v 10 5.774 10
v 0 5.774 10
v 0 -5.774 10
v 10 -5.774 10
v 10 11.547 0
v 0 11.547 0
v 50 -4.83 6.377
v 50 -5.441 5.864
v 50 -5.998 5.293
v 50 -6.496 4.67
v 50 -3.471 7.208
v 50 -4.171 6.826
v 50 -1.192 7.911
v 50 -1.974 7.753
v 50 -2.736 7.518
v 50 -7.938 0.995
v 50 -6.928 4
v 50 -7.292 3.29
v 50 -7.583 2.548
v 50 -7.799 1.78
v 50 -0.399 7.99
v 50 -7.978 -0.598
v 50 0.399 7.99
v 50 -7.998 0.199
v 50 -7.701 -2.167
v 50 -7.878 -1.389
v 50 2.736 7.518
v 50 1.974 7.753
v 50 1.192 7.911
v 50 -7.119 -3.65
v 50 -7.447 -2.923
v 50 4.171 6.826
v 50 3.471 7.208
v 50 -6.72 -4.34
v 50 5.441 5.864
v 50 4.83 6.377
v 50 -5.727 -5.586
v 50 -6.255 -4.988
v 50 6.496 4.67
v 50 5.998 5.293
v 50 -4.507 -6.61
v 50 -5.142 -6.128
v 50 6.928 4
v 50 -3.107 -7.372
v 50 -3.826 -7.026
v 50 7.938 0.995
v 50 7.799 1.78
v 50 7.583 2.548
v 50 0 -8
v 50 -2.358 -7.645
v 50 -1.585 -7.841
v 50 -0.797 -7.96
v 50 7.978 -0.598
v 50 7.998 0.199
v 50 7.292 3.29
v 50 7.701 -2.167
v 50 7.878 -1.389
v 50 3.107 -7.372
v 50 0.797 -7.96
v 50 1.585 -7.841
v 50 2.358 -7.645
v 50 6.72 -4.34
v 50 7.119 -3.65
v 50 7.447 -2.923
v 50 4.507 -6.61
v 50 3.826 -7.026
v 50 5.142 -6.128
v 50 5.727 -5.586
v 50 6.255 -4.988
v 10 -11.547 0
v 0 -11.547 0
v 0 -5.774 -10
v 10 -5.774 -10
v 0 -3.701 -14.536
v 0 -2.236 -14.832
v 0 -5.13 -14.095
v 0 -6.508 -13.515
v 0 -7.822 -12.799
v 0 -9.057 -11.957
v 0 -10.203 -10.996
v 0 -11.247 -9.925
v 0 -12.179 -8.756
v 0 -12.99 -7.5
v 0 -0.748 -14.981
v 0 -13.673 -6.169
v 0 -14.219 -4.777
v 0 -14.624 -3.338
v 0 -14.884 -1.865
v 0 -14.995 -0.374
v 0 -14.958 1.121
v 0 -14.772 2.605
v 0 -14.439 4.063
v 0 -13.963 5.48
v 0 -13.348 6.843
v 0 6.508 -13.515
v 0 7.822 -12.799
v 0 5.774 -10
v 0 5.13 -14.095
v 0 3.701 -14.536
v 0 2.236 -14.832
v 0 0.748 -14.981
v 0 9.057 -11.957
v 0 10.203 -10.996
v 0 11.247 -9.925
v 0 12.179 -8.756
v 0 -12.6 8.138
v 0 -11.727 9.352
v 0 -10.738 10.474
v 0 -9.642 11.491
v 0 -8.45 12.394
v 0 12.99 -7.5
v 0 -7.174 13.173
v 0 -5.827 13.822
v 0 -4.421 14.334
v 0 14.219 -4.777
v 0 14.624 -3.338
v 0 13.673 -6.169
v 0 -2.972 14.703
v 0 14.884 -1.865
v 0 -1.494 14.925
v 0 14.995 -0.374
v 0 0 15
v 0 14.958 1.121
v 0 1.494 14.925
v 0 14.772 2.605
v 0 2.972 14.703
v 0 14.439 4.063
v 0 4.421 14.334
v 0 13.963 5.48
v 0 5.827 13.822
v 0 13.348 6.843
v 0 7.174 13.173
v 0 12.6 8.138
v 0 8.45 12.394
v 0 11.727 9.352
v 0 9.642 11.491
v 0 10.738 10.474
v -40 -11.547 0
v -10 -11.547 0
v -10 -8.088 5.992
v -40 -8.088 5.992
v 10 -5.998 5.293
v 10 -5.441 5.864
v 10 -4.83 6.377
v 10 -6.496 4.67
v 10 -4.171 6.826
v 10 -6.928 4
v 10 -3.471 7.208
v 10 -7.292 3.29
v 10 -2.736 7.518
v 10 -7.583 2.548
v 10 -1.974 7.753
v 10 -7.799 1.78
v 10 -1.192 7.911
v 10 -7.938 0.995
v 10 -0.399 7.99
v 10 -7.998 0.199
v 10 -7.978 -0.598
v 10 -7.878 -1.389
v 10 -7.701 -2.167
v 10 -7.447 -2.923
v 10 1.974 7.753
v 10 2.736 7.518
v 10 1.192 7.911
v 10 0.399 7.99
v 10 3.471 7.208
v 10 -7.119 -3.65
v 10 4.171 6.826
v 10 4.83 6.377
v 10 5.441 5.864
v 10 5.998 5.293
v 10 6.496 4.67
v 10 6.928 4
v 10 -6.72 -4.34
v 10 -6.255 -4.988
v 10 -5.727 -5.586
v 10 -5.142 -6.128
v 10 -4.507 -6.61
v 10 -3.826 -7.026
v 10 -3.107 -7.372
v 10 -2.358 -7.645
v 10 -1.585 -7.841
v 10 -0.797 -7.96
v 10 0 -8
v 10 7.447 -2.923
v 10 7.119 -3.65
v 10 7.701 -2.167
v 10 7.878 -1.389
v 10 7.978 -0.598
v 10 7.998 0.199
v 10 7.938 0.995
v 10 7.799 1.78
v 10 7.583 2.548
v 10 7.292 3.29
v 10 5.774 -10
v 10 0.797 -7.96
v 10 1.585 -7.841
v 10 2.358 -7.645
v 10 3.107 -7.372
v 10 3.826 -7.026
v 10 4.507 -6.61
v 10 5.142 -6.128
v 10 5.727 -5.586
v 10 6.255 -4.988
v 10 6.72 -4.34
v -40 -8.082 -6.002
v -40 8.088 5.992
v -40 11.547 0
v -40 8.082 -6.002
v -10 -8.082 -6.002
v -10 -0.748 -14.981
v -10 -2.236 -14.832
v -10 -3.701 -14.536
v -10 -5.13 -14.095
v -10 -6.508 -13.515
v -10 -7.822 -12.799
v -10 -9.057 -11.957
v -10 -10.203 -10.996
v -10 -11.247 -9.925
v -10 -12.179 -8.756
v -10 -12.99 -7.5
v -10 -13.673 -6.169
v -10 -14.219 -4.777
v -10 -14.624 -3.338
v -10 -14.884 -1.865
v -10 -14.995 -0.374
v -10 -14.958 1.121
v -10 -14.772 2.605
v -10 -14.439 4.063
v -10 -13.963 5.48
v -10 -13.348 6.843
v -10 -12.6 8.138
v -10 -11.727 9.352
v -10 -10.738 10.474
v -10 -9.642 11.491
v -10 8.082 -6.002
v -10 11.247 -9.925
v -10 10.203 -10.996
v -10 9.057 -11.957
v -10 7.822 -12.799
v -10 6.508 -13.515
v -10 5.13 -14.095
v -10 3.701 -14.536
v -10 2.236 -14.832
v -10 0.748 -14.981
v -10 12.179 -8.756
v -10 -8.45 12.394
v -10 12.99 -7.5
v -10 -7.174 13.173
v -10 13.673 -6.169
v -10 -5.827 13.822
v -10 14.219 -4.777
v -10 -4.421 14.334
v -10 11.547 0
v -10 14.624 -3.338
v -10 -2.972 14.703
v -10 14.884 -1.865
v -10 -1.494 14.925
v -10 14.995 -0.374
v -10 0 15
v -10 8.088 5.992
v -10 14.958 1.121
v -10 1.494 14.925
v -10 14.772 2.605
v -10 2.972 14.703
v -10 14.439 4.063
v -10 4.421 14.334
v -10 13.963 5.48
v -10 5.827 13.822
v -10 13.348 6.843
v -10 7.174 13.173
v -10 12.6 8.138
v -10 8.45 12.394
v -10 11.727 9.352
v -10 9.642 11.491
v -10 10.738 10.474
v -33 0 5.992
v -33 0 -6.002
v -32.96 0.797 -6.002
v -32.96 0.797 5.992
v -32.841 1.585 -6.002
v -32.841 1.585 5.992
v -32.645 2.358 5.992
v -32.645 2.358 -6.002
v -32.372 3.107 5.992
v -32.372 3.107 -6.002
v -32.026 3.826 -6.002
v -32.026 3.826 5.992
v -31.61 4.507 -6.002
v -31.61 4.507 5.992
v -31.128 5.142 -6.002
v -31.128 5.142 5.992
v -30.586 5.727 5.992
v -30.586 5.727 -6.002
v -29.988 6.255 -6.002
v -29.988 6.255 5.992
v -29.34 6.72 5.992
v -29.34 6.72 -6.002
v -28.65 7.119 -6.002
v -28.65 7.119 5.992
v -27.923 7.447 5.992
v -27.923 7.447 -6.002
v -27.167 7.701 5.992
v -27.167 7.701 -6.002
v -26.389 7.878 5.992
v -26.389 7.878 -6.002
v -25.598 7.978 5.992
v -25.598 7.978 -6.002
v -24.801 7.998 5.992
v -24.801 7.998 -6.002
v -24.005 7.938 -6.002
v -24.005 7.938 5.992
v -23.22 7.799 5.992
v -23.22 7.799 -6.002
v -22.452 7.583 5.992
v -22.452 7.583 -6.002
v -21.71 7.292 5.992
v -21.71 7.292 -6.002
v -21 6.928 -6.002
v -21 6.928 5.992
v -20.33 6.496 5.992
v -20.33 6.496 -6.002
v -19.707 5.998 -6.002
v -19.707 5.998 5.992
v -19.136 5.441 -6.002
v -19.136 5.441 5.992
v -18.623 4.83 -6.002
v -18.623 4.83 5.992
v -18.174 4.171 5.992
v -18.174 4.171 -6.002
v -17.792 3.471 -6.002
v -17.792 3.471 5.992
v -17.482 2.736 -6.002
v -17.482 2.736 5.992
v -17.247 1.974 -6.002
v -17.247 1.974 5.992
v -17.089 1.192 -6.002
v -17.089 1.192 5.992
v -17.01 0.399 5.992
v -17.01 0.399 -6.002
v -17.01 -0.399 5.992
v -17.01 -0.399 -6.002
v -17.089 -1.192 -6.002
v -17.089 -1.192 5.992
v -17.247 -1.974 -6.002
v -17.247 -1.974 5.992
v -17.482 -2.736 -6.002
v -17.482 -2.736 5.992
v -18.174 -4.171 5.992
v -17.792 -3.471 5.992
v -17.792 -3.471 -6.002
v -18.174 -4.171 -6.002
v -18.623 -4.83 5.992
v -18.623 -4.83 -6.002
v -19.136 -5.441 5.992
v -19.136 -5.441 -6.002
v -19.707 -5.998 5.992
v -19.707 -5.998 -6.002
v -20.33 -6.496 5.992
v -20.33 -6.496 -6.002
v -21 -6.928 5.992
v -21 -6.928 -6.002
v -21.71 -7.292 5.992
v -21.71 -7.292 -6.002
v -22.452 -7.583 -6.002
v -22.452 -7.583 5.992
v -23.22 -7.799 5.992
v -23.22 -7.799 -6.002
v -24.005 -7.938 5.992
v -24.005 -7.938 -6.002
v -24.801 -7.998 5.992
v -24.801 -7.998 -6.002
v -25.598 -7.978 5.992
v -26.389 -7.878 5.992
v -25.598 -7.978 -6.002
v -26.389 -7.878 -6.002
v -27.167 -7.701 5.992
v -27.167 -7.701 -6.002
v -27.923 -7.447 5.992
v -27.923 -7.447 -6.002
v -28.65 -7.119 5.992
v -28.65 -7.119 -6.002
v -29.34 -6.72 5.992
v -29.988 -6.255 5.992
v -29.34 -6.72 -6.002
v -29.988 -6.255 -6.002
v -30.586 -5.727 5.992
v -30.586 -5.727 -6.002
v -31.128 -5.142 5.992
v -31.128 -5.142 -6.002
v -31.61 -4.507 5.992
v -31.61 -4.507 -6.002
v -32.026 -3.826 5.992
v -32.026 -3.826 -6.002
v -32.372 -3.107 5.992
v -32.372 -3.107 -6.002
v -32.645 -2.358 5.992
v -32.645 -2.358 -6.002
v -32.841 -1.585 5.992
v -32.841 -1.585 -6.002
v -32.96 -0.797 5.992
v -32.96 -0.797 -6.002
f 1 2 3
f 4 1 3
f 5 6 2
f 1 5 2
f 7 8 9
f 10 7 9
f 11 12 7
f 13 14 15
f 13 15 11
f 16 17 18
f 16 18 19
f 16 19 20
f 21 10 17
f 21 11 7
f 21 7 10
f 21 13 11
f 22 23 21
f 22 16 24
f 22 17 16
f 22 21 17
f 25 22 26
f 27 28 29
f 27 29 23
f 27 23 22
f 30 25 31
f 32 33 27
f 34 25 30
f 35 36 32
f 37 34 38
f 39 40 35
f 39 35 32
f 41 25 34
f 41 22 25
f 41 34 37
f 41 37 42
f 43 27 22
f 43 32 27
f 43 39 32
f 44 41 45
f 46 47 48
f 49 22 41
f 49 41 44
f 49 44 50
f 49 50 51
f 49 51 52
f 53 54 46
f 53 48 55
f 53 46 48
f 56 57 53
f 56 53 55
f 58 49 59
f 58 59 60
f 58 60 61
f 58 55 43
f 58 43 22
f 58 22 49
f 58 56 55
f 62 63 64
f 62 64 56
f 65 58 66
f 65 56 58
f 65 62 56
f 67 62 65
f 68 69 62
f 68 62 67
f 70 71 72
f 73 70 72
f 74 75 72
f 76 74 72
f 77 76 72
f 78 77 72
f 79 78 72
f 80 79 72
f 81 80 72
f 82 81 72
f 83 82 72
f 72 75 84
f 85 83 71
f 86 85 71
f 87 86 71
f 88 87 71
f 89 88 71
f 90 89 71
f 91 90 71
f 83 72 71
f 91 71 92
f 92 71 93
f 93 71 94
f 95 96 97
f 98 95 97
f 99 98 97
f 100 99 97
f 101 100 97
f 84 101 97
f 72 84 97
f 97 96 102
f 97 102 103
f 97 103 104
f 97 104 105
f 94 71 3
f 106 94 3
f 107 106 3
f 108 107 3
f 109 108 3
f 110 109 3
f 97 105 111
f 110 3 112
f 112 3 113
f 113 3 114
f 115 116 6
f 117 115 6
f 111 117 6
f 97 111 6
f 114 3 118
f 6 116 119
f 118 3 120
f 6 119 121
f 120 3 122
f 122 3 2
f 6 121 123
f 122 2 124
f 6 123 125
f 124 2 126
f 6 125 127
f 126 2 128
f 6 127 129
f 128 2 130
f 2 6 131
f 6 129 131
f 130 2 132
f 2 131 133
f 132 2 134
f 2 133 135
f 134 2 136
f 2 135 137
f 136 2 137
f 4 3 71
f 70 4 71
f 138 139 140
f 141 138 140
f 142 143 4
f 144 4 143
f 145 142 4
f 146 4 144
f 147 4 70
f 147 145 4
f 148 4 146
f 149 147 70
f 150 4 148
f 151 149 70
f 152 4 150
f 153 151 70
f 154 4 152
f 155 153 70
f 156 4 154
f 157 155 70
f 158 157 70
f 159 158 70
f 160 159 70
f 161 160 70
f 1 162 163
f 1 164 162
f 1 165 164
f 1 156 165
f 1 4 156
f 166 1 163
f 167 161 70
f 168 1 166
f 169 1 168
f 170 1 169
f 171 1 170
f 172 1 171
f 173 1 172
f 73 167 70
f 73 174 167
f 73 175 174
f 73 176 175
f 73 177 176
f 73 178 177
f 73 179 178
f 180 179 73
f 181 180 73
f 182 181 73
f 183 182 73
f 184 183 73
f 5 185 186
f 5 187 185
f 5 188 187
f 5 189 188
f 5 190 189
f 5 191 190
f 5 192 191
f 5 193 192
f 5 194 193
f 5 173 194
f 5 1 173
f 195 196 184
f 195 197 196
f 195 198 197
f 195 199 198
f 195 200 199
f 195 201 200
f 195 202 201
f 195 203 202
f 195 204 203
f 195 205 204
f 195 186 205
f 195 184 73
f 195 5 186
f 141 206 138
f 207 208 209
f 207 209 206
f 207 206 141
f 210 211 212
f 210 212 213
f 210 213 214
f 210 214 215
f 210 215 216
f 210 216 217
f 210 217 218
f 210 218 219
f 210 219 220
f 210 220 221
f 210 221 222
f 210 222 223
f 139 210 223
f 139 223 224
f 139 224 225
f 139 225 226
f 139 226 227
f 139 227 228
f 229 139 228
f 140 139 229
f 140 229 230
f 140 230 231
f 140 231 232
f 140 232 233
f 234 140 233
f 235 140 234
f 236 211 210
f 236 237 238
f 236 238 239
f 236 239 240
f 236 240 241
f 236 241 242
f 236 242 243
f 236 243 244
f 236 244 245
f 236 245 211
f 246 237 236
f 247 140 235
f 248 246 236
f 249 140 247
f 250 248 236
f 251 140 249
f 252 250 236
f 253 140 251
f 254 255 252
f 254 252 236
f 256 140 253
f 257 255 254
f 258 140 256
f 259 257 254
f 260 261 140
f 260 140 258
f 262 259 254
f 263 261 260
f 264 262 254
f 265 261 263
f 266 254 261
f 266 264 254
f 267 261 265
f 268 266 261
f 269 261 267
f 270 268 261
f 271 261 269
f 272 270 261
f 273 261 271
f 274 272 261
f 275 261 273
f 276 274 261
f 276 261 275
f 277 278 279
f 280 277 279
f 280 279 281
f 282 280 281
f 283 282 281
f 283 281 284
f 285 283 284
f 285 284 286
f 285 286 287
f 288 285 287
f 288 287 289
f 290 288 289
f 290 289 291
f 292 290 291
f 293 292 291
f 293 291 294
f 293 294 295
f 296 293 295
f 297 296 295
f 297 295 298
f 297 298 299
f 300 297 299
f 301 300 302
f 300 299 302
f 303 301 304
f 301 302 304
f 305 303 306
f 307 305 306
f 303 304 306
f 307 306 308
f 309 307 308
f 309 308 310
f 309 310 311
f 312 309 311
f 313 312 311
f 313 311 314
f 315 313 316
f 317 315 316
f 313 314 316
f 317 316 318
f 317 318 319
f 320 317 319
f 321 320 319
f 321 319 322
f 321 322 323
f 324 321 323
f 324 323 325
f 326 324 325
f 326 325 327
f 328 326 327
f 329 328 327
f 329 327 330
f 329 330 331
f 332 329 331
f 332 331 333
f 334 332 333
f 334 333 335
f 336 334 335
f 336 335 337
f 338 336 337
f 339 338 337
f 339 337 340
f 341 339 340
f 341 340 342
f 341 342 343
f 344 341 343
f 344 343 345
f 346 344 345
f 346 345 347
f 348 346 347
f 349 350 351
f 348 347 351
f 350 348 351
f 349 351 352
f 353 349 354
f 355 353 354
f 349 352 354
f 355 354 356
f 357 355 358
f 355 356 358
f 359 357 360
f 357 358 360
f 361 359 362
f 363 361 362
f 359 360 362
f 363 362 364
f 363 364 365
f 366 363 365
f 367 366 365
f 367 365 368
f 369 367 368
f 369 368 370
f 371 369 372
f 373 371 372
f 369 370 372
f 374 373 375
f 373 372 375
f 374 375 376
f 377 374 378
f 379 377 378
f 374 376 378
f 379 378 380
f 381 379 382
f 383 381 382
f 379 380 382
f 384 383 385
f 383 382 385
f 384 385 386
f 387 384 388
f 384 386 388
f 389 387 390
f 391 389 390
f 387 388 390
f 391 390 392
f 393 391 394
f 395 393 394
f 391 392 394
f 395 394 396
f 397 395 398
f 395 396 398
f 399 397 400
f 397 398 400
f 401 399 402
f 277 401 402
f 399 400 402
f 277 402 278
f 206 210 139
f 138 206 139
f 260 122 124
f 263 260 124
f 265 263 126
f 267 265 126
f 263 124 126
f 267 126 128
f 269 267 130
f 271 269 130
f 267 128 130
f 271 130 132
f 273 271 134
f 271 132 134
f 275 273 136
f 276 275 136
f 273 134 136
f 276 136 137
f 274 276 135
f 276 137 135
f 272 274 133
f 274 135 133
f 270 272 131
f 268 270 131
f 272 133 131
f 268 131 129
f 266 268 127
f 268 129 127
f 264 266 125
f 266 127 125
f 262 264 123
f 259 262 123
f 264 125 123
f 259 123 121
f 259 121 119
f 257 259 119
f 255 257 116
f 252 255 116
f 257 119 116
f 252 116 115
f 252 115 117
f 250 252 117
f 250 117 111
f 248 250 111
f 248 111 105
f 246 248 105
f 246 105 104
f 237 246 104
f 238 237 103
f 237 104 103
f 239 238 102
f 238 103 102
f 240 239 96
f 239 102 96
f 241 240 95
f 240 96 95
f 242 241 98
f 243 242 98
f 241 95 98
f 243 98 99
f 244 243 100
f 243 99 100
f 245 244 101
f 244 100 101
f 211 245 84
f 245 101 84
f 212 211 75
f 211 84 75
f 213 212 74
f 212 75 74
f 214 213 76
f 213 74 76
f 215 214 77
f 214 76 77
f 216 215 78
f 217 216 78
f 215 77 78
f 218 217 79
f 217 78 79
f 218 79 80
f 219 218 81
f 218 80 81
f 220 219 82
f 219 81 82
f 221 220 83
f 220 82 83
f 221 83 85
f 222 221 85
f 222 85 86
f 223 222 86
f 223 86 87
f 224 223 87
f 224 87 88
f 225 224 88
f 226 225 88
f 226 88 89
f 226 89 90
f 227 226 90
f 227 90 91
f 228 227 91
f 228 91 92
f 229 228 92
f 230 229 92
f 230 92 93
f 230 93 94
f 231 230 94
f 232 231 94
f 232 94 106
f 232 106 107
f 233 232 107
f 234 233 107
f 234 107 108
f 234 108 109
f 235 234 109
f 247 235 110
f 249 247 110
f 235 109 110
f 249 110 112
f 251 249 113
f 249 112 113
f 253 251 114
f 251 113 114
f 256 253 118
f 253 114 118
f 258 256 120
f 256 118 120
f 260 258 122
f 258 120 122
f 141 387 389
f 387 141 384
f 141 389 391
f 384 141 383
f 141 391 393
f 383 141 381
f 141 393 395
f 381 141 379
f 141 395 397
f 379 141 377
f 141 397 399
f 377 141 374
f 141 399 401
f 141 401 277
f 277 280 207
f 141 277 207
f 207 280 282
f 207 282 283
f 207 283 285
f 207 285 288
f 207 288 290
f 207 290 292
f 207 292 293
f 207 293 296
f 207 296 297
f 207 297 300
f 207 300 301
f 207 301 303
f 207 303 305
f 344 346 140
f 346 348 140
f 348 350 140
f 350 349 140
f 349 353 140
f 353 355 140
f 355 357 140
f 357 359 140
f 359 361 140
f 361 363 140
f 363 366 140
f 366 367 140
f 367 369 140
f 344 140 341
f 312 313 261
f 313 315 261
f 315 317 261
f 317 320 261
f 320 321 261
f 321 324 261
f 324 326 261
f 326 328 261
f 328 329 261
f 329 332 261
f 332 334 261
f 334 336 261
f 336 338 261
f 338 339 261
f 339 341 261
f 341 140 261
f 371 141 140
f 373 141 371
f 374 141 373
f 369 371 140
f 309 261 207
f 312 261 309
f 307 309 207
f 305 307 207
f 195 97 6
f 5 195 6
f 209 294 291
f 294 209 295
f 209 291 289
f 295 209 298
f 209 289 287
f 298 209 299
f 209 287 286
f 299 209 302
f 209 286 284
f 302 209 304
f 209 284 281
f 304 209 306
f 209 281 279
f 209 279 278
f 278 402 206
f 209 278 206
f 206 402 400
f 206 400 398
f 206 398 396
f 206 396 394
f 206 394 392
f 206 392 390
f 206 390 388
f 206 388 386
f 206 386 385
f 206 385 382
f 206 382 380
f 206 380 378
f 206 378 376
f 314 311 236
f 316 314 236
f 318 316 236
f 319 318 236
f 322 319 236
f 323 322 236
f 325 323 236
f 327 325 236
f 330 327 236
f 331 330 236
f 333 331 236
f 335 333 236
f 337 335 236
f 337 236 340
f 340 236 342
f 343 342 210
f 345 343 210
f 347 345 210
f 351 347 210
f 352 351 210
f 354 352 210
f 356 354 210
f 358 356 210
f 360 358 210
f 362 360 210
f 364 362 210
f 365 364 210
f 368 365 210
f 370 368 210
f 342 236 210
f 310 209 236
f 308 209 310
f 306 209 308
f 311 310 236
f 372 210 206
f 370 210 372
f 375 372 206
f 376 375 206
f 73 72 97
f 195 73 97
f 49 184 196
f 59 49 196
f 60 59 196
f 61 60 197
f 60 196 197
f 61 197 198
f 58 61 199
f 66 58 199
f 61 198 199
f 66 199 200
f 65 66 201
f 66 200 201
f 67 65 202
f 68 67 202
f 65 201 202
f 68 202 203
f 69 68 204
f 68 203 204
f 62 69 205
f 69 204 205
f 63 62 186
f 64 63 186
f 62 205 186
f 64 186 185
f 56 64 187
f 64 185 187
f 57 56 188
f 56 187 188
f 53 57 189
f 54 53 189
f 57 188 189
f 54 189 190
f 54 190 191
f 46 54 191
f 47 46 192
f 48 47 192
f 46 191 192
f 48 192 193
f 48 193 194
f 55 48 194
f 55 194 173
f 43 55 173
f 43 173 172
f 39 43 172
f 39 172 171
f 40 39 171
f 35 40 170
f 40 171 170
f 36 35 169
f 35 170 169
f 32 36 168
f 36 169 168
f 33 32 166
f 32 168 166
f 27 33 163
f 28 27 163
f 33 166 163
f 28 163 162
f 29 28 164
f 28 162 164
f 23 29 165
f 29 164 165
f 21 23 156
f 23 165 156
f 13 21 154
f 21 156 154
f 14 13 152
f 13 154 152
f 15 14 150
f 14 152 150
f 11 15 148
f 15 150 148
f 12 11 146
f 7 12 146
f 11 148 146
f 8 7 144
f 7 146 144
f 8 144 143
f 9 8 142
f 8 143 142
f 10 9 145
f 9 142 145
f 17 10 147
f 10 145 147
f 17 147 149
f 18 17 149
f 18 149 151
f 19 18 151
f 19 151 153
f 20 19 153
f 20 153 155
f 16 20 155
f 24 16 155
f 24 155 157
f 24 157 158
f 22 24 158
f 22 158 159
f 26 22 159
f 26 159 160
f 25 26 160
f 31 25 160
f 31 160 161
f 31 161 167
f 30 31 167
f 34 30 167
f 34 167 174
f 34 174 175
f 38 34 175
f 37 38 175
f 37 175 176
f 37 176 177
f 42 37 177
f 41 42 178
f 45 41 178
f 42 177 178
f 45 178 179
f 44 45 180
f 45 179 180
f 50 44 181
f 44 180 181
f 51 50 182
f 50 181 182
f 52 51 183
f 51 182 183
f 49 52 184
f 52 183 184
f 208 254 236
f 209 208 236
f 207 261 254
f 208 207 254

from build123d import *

# Parameters (mm, degrees)
EXTRUDE_1_DEPTH     = 10
SKETCH_2_R          = 8
EXTRUDE_2_DEPTH     = 40
SKETCH_5_R          = 15
EXTRUDE_4_DEPTH     = 10
EXTRUDE_3_DEPTH     = 30
CUT_EXTRUDE_1_REACH = 23.002
SKETCH_4_R          = 8


with BuildPart() as part:
    # Эскиз1 → Бобышка-Вытянуть1 (new body)
    with BuildSketch(Plane(origin=(0, 0, 0), x_dir=(0, 0, -1), z_dir=(1, 0, 0))):
        Polygon((0, 11.547005384), (-10, 5.773502692), (-10, -5.773502692), (0, -11.547005384), (10, -5.773502692), (10, 5.773502692), align=None)
    extrude(amount=EXTRUDE_1_DEPTH)

    # Эскиз2 → Бобышка-Вытянуть2 (add)
    with BuildSketch(Plane(origin=(10, 0, 0), x_dir=(0, 0, -1), z_dir=(1, 0, 0))):
        Circle(SKETCH_2_R)
    extrude(amount=EXTRUDE_2_DEPTH)

    # Эскиз5 → Бобышка-Вытянуть4 (add)
    with BuildSketch(Plane.ZY):
        Circle(SKETCH_5_R)
    extrude(amount=EXTRUDE_4_DEPTH)

    # Эскиз3 → Бобышка-Вытянуть3 (add)
    with BuildSketch(Plane.ZY.offset(10)):
        Polygon((0, 11.547005384), (-6.001748602, 8.081894213), (-6.001748602, -8.081894213), (0, -11.547005384), (5.991634546, -8.087733566), (5.991634546, 8.087733566), align=None)
    extrude(amount=EXTRUDE_3_DEPTH)

    # Эскиз4 → Вырез-Вытянуть1 (cut, up to next)
    with BuildSketch(Plane(origin=(0, 0, -6.001748602), x_dir=(-1, 0, 0), z_dir=(0, 0, -1)), mode=Mode.PRIVATE) as cut_extrude_1_sk1:
        with Locations((25, 0)):
            Circle(SKETCH_4_R)
    cut_extrude_1_tool1 = extrude(cut_extrude_1_sk1.sketch, amount=-CUT_EXTRUDE_1_REACH, mode=Mode.PRIVATE) & part.part
    add(cut_extrude_1_tool1.solids().sort_by_distance((-25, 0, -6.001749))[0], mode=Mode.SUBTRACT)


solid = part.part
